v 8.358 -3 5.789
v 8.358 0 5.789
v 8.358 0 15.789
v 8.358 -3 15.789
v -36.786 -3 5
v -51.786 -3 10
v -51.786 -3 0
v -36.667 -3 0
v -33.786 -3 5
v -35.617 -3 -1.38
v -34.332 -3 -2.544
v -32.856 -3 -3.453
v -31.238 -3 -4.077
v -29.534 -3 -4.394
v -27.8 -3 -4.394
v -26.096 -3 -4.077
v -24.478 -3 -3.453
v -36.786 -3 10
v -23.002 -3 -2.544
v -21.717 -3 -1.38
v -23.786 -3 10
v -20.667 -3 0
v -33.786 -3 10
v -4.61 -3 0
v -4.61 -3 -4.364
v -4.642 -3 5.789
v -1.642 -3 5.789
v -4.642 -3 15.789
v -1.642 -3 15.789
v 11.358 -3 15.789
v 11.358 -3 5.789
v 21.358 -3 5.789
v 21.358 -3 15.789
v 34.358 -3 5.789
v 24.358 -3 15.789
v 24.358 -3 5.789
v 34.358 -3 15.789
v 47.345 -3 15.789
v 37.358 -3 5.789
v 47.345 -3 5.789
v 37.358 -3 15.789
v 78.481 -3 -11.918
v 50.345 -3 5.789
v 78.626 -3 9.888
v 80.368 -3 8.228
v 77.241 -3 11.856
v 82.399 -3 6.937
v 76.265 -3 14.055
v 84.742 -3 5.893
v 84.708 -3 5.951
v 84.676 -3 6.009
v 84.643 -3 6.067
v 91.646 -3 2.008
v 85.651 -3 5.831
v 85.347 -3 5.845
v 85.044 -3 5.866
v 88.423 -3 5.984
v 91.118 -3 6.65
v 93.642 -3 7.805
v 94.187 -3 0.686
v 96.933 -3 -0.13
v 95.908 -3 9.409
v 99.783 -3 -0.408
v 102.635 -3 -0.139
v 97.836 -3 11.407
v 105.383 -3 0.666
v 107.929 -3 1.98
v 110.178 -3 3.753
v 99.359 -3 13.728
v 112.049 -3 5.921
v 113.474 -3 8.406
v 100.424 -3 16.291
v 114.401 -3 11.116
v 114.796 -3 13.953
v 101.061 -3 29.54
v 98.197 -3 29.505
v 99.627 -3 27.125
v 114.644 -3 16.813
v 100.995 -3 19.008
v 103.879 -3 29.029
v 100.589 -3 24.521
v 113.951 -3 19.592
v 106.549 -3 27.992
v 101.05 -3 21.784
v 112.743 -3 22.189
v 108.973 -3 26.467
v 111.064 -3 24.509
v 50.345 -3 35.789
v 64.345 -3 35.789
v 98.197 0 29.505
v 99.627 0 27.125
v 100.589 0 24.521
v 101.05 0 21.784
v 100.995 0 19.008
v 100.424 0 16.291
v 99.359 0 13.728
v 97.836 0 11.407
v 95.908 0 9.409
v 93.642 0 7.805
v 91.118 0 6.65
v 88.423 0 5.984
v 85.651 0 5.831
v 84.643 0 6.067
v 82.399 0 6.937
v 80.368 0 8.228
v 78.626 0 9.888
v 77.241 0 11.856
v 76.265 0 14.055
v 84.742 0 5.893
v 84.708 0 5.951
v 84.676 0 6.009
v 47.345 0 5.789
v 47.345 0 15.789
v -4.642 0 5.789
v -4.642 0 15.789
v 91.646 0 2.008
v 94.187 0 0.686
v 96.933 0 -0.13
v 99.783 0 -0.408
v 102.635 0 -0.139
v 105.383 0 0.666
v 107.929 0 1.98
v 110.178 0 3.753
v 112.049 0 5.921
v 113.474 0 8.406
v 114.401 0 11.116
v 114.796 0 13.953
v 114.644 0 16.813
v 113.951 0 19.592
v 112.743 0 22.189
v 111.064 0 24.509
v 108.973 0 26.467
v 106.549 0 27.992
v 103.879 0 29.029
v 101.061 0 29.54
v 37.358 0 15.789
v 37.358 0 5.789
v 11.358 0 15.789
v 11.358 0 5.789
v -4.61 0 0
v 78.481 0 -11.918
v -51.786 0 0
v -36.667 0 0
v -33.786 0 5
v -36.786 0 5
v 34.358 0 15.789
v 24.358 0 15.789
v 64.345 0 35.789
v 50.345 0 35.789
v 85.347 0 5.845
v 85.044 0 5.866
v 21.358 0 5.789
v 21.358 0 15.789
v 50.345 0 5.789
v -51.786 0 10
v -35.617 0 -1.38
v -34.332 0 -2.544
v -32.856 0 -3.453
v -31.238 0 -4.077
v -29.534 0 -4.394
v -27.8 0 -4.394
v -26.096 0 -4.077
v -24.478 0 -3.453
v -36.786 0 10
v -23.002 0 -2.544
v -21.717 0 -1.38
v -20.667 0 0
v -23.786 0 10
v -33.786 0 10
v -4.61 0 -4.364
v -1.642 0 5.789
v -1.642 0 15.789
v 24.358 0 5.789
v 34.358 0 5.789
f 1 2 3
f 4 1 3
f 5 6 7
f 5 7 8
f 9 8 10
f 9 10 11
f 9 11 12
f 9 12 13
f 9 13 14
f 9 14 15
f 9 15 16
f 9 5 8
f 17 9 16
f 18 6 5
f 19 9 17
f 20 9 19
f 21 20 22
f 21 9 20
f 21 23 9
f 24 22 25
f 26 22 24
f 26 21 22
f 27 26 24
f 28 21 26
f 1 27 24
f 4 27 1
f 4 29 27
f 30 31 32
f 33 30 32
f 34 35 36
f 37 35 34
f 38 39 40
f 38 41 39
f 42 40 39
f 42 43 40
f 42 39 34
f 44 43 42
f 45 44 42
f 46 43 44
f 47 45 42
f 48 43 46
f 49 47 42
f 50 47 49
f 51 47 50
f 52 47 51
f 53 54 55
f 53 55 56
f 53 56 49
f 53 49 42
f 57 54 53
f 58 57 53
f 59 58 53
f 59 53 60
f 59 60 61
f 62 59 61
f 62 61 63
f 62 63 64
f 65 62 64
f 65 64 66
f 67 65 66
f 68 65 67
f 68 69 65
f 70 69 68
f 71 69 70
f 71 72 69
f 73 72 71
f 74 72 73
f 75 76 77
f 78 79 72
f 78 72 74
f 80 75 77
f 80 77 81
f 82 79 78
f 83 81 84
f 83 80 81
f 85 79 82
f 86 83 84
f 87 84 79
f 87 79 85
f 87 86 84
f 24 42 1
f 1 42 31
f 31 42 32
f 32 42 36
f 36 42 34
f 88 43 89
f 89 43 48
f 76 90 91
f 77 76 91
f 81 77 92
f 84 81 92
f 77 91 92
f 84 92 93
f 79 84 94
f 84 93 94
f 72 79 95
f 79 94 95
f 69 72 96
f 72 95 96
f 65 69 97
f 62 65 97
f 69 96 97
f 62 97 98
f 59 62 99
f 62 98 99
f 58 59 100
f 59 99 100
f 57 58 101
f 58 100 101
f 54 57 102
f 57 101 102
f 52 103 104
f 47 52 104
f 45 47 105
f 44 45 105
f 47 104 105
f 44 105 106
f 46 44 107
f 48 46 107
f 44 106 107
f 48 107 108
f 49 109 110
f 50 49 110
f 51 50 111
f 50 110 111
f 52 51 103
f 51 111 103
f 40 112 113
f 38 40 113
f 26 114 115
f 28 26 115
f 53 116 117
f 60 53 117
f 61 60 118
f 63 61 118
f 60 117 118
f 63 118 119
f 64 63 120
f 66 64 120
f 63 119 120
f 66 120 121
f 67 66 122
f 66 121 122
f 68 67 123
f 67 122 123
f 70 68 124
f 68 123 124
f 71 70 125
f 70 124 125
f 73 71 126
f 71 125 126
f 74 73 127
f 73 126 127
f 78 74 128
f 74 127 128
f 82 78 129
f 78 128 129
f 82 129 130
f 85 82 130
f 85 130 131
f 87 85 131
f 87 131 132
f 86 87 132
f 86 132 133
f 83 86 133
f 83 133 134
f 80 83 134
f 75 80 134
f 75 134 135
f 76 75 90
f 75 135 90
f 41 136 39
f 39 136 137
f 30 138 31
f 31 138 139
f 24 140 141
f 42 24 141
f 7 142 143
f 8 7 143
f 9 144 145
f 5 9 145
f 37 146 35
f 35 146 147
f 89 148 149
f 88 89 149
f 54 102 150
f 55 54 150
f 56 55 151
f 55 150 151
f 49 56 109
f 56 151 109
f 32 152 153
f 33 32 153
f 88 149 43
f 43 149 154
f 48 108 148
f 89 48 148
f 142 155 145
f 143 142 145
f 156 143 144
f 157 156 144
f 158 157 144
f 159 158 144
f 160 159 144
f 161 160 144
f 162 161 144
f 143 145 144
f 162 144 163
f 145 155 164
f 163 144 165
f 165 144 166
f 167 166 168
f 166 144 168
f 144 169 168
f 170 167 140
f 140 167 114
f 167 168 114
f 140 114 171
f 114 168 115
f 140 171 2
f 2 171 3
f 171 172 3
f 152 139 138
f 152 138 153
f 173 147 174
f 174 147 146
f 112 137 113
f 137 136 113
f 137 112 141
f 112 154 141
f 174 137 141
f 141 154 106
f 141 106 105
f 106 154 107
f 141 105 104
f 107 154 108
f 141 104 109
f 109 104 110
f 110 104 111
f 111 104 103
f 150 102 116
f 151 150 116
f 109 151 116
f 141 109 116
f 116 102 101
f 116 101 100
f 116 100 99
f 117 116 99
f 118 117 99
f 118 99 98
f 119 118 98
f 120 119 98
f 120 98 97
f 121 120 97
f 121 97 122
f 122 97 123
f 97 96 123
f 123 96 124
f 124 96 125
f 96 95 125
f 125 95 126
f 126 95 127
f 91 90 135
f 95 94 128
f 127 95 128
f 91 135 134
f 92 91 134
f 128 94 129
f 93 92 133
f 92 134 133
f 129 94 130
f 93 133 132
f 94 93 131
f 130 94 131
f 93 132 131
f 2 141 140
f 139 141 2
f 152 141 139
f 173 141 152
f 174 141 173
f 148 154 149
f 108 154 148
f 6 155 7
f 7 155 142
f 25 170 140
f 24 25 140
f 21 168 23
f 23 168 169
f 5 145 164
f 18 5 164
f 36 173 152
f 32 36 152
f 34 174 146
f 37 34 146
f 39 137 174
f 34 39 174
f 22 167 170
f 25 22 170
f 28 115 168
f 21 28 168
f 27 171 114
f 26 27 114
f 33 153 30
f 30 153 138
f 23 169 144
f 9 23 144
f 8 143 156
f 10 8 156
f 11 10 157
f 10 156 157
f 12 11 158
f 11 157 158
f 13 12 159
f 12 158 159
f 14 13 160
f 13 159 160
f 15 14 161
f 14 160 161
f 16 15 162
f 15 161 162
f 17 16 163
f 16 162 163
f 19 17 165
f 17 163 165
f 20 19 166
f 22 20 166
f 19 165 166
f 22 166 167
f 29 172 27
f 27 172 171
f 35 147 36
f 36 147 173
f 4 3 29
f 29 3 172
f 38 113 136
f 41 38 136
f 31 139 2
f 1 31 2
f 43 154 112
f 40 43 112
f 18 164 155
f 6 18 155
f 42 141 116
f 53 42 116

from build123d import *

# Parameters (mm, degrees)
F1_DEPTH = 3


with BuildPart() as f1:
    # F0 (on Front) → F1 (new body)
    with BuildSketch(Plane.XZ):
        with BuildLine():
            Line((-36.785731, 10), (-51.785731, 10))
            Line((-51.785731, 10), (-51.785731, 0))
            Line((-51.785731, 0), (-36.785731, 0))
            Line((-36.785731, 0), (-36.666999, 0))
            ThreePointArc((-36.666999, 0), (-28.666999, -4.433981), (-20.666999, 0))
            Line((-20.666999, 0), (-4.60982, -4.364454))
            Line((-4.60982, -4.364454), (-4.60982, 0))
            Line((-4.60982, 0), (78.480504, -11.91812))
            Line((78.480504, -11.91812), (91.646317, 2.007614))
            ThreePointArc((91.646317, 2.007614), (114.40079, 11.115801), (98.197224, 29.505187))
            ThreePointArc((98.197224, 29.505187), (99.359, 13.727695), (85.650786, 5.830618))
            ThreePointArc((85.650786, 5.830618), (85.195749, 5.854985), (84.741672, 5.893281))
            ThreePointArc((84.741672, 5.893281), (84.691969, 5.979948), (84.642764, 6.066899))
            ThreePointArc((84.642764, 6.066899), (79.456589, 9.015264), (76.264674, 14.055199))
            Line((76.264674, 14.055199), (64.344662, 35.789207))
            Line((64.344662, 35.789207), (50.344662, 35.789207))
            Line((50.344662, 35.789207), (50.344662, 5.789207))
            Line((50.344662, 5.789207), (47.344662, 5.789207))
            Line((47.344662, 5.789207), (47.344662, 15.789207))
            Line((47.344662, 15.789207), (37.358069, 15.789207))
            Line((37.358069, 15.789207), (37.358069, 5.789207))
            Line((37.358069, 5.789207), (34.358069, 5.789207))
            Line((34.358069, 5.789207), (34.358069, 15.789207))
            Line((34.358069, 15.789207), (24.358069, 15.789207))
            Line((24.358069, 15.789207), (24.358069, 5.789207))
            Line((24.358069, 5.789207), (21.358069, 5.789207))
            Line((21.358069, 5.789207), (21.358069, 15.789207))
            Line((21.358069, 15.789207), (11.358069, 15.789207))
            Line((11.358069, 15.789207), (11.358069, 5.789207))
            Line((11.358069, 5.789207), (8.358069, 5.789207))
            Line((8.358069, 5.789207), (8.358069, 15.789207))
            Line((8.358069, 15.789207), (-1.641931, 15.789207))
            Line((-1.641931, 15.789207), (-1.641931, 5.789207))
            Line((-1.641931, 5.789207), (-4.641931, 5.789207))
            Line((-4.641931, 5.789207), (-4.641931, 15.789207))
            Line((-4.641931, 15.789207), (-23.785731, 10))
            Line((-23.785731, 10), (-33.785731, 10))
            Line((-33.785731, 10), (-33.785731, 5))
            Line((-33.785731, 5), (-36.785731, 5))
            Line((-36.785731, 5), (-36.785731, 10))
        make_face()
    extrude(amount=F1_DEPTH)


solid = f1.part
